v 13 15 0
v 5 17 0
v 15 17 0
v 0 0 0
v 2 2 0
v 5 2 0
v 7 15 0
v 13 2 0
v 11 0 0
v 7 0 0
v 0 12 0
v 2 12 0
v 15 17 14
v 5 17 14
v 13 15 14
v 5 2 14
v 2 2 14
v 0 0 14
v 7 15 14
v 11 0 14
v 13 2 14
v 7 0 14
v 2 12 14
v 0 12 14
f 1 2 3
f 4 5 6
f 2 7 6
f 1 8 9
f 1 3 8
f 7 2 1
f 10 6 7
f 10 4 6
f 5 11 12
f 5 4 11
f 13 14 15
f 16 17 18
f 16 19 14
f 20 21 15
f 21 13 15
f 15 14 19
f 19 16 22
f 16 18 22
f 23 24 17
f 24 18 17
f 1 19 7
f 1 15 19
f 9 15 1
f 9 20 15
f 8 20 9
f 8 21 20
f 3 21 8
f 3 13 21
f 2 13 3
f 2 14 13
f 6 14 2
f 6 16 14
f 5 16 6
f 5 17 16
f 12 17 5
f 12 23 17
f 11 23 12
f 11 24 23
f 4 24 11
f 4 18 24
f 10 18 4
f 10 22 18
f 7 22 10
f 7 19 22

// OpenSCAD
// The thickness of the shell and its sides (in mm).
thickness = 2; // [2:8]

// The depth of the sides that will be on the outsides of the drawers (in mm).
sideDepth = 10; // [5:25]

// The depth of the clip (in mm).
trayDepth = 15; // [5:200]

// The width of the clip (in mm).
trayWidth = 10; // [20:200]

// An offset applied to angle the bottom of the tray inwards, creating slight slopes on the left and right side (in mm).
offset = 0; // [0:10]

// Print with the bottom of the tray on the print bed (if possible).
printBottomDown = true;

{}

// Parameters for the US General Series 2 Drawers
$drawerID = 10; // 20250930: 302-305mm

$metal = 3;

// The points that make up the tray's body/shape.
$trayPoints=[
    [0,0],
    [thickness + $metal + thickness, 0],
    [thickness + $metal + thickness + offset, trayDepth],
    [thickness + $metal + thickness + ($drawerID - thickness * 2 - offset), trayDepth],
    [thickness + $metal + thickness + ($drawerID - thickness * 3), 0],

    [thickness * 2 + $metal + thickness + ($drawerID - thickness * 3), thickness],

    [thickness + $metal + $drawerID - offset, thickness + trayDepth],
    [thickness + $metal + offset, thickness + trayDepth],
    [thickness + $metal, thickness],
    [thickness, thickness],
    [thickness, thickness+sideDepth],

    [0, thickness+sideDepth],
];

group() {
    linear_extrude(trayWidth + thickness * 2)
    polygon($trayPoints);
}
